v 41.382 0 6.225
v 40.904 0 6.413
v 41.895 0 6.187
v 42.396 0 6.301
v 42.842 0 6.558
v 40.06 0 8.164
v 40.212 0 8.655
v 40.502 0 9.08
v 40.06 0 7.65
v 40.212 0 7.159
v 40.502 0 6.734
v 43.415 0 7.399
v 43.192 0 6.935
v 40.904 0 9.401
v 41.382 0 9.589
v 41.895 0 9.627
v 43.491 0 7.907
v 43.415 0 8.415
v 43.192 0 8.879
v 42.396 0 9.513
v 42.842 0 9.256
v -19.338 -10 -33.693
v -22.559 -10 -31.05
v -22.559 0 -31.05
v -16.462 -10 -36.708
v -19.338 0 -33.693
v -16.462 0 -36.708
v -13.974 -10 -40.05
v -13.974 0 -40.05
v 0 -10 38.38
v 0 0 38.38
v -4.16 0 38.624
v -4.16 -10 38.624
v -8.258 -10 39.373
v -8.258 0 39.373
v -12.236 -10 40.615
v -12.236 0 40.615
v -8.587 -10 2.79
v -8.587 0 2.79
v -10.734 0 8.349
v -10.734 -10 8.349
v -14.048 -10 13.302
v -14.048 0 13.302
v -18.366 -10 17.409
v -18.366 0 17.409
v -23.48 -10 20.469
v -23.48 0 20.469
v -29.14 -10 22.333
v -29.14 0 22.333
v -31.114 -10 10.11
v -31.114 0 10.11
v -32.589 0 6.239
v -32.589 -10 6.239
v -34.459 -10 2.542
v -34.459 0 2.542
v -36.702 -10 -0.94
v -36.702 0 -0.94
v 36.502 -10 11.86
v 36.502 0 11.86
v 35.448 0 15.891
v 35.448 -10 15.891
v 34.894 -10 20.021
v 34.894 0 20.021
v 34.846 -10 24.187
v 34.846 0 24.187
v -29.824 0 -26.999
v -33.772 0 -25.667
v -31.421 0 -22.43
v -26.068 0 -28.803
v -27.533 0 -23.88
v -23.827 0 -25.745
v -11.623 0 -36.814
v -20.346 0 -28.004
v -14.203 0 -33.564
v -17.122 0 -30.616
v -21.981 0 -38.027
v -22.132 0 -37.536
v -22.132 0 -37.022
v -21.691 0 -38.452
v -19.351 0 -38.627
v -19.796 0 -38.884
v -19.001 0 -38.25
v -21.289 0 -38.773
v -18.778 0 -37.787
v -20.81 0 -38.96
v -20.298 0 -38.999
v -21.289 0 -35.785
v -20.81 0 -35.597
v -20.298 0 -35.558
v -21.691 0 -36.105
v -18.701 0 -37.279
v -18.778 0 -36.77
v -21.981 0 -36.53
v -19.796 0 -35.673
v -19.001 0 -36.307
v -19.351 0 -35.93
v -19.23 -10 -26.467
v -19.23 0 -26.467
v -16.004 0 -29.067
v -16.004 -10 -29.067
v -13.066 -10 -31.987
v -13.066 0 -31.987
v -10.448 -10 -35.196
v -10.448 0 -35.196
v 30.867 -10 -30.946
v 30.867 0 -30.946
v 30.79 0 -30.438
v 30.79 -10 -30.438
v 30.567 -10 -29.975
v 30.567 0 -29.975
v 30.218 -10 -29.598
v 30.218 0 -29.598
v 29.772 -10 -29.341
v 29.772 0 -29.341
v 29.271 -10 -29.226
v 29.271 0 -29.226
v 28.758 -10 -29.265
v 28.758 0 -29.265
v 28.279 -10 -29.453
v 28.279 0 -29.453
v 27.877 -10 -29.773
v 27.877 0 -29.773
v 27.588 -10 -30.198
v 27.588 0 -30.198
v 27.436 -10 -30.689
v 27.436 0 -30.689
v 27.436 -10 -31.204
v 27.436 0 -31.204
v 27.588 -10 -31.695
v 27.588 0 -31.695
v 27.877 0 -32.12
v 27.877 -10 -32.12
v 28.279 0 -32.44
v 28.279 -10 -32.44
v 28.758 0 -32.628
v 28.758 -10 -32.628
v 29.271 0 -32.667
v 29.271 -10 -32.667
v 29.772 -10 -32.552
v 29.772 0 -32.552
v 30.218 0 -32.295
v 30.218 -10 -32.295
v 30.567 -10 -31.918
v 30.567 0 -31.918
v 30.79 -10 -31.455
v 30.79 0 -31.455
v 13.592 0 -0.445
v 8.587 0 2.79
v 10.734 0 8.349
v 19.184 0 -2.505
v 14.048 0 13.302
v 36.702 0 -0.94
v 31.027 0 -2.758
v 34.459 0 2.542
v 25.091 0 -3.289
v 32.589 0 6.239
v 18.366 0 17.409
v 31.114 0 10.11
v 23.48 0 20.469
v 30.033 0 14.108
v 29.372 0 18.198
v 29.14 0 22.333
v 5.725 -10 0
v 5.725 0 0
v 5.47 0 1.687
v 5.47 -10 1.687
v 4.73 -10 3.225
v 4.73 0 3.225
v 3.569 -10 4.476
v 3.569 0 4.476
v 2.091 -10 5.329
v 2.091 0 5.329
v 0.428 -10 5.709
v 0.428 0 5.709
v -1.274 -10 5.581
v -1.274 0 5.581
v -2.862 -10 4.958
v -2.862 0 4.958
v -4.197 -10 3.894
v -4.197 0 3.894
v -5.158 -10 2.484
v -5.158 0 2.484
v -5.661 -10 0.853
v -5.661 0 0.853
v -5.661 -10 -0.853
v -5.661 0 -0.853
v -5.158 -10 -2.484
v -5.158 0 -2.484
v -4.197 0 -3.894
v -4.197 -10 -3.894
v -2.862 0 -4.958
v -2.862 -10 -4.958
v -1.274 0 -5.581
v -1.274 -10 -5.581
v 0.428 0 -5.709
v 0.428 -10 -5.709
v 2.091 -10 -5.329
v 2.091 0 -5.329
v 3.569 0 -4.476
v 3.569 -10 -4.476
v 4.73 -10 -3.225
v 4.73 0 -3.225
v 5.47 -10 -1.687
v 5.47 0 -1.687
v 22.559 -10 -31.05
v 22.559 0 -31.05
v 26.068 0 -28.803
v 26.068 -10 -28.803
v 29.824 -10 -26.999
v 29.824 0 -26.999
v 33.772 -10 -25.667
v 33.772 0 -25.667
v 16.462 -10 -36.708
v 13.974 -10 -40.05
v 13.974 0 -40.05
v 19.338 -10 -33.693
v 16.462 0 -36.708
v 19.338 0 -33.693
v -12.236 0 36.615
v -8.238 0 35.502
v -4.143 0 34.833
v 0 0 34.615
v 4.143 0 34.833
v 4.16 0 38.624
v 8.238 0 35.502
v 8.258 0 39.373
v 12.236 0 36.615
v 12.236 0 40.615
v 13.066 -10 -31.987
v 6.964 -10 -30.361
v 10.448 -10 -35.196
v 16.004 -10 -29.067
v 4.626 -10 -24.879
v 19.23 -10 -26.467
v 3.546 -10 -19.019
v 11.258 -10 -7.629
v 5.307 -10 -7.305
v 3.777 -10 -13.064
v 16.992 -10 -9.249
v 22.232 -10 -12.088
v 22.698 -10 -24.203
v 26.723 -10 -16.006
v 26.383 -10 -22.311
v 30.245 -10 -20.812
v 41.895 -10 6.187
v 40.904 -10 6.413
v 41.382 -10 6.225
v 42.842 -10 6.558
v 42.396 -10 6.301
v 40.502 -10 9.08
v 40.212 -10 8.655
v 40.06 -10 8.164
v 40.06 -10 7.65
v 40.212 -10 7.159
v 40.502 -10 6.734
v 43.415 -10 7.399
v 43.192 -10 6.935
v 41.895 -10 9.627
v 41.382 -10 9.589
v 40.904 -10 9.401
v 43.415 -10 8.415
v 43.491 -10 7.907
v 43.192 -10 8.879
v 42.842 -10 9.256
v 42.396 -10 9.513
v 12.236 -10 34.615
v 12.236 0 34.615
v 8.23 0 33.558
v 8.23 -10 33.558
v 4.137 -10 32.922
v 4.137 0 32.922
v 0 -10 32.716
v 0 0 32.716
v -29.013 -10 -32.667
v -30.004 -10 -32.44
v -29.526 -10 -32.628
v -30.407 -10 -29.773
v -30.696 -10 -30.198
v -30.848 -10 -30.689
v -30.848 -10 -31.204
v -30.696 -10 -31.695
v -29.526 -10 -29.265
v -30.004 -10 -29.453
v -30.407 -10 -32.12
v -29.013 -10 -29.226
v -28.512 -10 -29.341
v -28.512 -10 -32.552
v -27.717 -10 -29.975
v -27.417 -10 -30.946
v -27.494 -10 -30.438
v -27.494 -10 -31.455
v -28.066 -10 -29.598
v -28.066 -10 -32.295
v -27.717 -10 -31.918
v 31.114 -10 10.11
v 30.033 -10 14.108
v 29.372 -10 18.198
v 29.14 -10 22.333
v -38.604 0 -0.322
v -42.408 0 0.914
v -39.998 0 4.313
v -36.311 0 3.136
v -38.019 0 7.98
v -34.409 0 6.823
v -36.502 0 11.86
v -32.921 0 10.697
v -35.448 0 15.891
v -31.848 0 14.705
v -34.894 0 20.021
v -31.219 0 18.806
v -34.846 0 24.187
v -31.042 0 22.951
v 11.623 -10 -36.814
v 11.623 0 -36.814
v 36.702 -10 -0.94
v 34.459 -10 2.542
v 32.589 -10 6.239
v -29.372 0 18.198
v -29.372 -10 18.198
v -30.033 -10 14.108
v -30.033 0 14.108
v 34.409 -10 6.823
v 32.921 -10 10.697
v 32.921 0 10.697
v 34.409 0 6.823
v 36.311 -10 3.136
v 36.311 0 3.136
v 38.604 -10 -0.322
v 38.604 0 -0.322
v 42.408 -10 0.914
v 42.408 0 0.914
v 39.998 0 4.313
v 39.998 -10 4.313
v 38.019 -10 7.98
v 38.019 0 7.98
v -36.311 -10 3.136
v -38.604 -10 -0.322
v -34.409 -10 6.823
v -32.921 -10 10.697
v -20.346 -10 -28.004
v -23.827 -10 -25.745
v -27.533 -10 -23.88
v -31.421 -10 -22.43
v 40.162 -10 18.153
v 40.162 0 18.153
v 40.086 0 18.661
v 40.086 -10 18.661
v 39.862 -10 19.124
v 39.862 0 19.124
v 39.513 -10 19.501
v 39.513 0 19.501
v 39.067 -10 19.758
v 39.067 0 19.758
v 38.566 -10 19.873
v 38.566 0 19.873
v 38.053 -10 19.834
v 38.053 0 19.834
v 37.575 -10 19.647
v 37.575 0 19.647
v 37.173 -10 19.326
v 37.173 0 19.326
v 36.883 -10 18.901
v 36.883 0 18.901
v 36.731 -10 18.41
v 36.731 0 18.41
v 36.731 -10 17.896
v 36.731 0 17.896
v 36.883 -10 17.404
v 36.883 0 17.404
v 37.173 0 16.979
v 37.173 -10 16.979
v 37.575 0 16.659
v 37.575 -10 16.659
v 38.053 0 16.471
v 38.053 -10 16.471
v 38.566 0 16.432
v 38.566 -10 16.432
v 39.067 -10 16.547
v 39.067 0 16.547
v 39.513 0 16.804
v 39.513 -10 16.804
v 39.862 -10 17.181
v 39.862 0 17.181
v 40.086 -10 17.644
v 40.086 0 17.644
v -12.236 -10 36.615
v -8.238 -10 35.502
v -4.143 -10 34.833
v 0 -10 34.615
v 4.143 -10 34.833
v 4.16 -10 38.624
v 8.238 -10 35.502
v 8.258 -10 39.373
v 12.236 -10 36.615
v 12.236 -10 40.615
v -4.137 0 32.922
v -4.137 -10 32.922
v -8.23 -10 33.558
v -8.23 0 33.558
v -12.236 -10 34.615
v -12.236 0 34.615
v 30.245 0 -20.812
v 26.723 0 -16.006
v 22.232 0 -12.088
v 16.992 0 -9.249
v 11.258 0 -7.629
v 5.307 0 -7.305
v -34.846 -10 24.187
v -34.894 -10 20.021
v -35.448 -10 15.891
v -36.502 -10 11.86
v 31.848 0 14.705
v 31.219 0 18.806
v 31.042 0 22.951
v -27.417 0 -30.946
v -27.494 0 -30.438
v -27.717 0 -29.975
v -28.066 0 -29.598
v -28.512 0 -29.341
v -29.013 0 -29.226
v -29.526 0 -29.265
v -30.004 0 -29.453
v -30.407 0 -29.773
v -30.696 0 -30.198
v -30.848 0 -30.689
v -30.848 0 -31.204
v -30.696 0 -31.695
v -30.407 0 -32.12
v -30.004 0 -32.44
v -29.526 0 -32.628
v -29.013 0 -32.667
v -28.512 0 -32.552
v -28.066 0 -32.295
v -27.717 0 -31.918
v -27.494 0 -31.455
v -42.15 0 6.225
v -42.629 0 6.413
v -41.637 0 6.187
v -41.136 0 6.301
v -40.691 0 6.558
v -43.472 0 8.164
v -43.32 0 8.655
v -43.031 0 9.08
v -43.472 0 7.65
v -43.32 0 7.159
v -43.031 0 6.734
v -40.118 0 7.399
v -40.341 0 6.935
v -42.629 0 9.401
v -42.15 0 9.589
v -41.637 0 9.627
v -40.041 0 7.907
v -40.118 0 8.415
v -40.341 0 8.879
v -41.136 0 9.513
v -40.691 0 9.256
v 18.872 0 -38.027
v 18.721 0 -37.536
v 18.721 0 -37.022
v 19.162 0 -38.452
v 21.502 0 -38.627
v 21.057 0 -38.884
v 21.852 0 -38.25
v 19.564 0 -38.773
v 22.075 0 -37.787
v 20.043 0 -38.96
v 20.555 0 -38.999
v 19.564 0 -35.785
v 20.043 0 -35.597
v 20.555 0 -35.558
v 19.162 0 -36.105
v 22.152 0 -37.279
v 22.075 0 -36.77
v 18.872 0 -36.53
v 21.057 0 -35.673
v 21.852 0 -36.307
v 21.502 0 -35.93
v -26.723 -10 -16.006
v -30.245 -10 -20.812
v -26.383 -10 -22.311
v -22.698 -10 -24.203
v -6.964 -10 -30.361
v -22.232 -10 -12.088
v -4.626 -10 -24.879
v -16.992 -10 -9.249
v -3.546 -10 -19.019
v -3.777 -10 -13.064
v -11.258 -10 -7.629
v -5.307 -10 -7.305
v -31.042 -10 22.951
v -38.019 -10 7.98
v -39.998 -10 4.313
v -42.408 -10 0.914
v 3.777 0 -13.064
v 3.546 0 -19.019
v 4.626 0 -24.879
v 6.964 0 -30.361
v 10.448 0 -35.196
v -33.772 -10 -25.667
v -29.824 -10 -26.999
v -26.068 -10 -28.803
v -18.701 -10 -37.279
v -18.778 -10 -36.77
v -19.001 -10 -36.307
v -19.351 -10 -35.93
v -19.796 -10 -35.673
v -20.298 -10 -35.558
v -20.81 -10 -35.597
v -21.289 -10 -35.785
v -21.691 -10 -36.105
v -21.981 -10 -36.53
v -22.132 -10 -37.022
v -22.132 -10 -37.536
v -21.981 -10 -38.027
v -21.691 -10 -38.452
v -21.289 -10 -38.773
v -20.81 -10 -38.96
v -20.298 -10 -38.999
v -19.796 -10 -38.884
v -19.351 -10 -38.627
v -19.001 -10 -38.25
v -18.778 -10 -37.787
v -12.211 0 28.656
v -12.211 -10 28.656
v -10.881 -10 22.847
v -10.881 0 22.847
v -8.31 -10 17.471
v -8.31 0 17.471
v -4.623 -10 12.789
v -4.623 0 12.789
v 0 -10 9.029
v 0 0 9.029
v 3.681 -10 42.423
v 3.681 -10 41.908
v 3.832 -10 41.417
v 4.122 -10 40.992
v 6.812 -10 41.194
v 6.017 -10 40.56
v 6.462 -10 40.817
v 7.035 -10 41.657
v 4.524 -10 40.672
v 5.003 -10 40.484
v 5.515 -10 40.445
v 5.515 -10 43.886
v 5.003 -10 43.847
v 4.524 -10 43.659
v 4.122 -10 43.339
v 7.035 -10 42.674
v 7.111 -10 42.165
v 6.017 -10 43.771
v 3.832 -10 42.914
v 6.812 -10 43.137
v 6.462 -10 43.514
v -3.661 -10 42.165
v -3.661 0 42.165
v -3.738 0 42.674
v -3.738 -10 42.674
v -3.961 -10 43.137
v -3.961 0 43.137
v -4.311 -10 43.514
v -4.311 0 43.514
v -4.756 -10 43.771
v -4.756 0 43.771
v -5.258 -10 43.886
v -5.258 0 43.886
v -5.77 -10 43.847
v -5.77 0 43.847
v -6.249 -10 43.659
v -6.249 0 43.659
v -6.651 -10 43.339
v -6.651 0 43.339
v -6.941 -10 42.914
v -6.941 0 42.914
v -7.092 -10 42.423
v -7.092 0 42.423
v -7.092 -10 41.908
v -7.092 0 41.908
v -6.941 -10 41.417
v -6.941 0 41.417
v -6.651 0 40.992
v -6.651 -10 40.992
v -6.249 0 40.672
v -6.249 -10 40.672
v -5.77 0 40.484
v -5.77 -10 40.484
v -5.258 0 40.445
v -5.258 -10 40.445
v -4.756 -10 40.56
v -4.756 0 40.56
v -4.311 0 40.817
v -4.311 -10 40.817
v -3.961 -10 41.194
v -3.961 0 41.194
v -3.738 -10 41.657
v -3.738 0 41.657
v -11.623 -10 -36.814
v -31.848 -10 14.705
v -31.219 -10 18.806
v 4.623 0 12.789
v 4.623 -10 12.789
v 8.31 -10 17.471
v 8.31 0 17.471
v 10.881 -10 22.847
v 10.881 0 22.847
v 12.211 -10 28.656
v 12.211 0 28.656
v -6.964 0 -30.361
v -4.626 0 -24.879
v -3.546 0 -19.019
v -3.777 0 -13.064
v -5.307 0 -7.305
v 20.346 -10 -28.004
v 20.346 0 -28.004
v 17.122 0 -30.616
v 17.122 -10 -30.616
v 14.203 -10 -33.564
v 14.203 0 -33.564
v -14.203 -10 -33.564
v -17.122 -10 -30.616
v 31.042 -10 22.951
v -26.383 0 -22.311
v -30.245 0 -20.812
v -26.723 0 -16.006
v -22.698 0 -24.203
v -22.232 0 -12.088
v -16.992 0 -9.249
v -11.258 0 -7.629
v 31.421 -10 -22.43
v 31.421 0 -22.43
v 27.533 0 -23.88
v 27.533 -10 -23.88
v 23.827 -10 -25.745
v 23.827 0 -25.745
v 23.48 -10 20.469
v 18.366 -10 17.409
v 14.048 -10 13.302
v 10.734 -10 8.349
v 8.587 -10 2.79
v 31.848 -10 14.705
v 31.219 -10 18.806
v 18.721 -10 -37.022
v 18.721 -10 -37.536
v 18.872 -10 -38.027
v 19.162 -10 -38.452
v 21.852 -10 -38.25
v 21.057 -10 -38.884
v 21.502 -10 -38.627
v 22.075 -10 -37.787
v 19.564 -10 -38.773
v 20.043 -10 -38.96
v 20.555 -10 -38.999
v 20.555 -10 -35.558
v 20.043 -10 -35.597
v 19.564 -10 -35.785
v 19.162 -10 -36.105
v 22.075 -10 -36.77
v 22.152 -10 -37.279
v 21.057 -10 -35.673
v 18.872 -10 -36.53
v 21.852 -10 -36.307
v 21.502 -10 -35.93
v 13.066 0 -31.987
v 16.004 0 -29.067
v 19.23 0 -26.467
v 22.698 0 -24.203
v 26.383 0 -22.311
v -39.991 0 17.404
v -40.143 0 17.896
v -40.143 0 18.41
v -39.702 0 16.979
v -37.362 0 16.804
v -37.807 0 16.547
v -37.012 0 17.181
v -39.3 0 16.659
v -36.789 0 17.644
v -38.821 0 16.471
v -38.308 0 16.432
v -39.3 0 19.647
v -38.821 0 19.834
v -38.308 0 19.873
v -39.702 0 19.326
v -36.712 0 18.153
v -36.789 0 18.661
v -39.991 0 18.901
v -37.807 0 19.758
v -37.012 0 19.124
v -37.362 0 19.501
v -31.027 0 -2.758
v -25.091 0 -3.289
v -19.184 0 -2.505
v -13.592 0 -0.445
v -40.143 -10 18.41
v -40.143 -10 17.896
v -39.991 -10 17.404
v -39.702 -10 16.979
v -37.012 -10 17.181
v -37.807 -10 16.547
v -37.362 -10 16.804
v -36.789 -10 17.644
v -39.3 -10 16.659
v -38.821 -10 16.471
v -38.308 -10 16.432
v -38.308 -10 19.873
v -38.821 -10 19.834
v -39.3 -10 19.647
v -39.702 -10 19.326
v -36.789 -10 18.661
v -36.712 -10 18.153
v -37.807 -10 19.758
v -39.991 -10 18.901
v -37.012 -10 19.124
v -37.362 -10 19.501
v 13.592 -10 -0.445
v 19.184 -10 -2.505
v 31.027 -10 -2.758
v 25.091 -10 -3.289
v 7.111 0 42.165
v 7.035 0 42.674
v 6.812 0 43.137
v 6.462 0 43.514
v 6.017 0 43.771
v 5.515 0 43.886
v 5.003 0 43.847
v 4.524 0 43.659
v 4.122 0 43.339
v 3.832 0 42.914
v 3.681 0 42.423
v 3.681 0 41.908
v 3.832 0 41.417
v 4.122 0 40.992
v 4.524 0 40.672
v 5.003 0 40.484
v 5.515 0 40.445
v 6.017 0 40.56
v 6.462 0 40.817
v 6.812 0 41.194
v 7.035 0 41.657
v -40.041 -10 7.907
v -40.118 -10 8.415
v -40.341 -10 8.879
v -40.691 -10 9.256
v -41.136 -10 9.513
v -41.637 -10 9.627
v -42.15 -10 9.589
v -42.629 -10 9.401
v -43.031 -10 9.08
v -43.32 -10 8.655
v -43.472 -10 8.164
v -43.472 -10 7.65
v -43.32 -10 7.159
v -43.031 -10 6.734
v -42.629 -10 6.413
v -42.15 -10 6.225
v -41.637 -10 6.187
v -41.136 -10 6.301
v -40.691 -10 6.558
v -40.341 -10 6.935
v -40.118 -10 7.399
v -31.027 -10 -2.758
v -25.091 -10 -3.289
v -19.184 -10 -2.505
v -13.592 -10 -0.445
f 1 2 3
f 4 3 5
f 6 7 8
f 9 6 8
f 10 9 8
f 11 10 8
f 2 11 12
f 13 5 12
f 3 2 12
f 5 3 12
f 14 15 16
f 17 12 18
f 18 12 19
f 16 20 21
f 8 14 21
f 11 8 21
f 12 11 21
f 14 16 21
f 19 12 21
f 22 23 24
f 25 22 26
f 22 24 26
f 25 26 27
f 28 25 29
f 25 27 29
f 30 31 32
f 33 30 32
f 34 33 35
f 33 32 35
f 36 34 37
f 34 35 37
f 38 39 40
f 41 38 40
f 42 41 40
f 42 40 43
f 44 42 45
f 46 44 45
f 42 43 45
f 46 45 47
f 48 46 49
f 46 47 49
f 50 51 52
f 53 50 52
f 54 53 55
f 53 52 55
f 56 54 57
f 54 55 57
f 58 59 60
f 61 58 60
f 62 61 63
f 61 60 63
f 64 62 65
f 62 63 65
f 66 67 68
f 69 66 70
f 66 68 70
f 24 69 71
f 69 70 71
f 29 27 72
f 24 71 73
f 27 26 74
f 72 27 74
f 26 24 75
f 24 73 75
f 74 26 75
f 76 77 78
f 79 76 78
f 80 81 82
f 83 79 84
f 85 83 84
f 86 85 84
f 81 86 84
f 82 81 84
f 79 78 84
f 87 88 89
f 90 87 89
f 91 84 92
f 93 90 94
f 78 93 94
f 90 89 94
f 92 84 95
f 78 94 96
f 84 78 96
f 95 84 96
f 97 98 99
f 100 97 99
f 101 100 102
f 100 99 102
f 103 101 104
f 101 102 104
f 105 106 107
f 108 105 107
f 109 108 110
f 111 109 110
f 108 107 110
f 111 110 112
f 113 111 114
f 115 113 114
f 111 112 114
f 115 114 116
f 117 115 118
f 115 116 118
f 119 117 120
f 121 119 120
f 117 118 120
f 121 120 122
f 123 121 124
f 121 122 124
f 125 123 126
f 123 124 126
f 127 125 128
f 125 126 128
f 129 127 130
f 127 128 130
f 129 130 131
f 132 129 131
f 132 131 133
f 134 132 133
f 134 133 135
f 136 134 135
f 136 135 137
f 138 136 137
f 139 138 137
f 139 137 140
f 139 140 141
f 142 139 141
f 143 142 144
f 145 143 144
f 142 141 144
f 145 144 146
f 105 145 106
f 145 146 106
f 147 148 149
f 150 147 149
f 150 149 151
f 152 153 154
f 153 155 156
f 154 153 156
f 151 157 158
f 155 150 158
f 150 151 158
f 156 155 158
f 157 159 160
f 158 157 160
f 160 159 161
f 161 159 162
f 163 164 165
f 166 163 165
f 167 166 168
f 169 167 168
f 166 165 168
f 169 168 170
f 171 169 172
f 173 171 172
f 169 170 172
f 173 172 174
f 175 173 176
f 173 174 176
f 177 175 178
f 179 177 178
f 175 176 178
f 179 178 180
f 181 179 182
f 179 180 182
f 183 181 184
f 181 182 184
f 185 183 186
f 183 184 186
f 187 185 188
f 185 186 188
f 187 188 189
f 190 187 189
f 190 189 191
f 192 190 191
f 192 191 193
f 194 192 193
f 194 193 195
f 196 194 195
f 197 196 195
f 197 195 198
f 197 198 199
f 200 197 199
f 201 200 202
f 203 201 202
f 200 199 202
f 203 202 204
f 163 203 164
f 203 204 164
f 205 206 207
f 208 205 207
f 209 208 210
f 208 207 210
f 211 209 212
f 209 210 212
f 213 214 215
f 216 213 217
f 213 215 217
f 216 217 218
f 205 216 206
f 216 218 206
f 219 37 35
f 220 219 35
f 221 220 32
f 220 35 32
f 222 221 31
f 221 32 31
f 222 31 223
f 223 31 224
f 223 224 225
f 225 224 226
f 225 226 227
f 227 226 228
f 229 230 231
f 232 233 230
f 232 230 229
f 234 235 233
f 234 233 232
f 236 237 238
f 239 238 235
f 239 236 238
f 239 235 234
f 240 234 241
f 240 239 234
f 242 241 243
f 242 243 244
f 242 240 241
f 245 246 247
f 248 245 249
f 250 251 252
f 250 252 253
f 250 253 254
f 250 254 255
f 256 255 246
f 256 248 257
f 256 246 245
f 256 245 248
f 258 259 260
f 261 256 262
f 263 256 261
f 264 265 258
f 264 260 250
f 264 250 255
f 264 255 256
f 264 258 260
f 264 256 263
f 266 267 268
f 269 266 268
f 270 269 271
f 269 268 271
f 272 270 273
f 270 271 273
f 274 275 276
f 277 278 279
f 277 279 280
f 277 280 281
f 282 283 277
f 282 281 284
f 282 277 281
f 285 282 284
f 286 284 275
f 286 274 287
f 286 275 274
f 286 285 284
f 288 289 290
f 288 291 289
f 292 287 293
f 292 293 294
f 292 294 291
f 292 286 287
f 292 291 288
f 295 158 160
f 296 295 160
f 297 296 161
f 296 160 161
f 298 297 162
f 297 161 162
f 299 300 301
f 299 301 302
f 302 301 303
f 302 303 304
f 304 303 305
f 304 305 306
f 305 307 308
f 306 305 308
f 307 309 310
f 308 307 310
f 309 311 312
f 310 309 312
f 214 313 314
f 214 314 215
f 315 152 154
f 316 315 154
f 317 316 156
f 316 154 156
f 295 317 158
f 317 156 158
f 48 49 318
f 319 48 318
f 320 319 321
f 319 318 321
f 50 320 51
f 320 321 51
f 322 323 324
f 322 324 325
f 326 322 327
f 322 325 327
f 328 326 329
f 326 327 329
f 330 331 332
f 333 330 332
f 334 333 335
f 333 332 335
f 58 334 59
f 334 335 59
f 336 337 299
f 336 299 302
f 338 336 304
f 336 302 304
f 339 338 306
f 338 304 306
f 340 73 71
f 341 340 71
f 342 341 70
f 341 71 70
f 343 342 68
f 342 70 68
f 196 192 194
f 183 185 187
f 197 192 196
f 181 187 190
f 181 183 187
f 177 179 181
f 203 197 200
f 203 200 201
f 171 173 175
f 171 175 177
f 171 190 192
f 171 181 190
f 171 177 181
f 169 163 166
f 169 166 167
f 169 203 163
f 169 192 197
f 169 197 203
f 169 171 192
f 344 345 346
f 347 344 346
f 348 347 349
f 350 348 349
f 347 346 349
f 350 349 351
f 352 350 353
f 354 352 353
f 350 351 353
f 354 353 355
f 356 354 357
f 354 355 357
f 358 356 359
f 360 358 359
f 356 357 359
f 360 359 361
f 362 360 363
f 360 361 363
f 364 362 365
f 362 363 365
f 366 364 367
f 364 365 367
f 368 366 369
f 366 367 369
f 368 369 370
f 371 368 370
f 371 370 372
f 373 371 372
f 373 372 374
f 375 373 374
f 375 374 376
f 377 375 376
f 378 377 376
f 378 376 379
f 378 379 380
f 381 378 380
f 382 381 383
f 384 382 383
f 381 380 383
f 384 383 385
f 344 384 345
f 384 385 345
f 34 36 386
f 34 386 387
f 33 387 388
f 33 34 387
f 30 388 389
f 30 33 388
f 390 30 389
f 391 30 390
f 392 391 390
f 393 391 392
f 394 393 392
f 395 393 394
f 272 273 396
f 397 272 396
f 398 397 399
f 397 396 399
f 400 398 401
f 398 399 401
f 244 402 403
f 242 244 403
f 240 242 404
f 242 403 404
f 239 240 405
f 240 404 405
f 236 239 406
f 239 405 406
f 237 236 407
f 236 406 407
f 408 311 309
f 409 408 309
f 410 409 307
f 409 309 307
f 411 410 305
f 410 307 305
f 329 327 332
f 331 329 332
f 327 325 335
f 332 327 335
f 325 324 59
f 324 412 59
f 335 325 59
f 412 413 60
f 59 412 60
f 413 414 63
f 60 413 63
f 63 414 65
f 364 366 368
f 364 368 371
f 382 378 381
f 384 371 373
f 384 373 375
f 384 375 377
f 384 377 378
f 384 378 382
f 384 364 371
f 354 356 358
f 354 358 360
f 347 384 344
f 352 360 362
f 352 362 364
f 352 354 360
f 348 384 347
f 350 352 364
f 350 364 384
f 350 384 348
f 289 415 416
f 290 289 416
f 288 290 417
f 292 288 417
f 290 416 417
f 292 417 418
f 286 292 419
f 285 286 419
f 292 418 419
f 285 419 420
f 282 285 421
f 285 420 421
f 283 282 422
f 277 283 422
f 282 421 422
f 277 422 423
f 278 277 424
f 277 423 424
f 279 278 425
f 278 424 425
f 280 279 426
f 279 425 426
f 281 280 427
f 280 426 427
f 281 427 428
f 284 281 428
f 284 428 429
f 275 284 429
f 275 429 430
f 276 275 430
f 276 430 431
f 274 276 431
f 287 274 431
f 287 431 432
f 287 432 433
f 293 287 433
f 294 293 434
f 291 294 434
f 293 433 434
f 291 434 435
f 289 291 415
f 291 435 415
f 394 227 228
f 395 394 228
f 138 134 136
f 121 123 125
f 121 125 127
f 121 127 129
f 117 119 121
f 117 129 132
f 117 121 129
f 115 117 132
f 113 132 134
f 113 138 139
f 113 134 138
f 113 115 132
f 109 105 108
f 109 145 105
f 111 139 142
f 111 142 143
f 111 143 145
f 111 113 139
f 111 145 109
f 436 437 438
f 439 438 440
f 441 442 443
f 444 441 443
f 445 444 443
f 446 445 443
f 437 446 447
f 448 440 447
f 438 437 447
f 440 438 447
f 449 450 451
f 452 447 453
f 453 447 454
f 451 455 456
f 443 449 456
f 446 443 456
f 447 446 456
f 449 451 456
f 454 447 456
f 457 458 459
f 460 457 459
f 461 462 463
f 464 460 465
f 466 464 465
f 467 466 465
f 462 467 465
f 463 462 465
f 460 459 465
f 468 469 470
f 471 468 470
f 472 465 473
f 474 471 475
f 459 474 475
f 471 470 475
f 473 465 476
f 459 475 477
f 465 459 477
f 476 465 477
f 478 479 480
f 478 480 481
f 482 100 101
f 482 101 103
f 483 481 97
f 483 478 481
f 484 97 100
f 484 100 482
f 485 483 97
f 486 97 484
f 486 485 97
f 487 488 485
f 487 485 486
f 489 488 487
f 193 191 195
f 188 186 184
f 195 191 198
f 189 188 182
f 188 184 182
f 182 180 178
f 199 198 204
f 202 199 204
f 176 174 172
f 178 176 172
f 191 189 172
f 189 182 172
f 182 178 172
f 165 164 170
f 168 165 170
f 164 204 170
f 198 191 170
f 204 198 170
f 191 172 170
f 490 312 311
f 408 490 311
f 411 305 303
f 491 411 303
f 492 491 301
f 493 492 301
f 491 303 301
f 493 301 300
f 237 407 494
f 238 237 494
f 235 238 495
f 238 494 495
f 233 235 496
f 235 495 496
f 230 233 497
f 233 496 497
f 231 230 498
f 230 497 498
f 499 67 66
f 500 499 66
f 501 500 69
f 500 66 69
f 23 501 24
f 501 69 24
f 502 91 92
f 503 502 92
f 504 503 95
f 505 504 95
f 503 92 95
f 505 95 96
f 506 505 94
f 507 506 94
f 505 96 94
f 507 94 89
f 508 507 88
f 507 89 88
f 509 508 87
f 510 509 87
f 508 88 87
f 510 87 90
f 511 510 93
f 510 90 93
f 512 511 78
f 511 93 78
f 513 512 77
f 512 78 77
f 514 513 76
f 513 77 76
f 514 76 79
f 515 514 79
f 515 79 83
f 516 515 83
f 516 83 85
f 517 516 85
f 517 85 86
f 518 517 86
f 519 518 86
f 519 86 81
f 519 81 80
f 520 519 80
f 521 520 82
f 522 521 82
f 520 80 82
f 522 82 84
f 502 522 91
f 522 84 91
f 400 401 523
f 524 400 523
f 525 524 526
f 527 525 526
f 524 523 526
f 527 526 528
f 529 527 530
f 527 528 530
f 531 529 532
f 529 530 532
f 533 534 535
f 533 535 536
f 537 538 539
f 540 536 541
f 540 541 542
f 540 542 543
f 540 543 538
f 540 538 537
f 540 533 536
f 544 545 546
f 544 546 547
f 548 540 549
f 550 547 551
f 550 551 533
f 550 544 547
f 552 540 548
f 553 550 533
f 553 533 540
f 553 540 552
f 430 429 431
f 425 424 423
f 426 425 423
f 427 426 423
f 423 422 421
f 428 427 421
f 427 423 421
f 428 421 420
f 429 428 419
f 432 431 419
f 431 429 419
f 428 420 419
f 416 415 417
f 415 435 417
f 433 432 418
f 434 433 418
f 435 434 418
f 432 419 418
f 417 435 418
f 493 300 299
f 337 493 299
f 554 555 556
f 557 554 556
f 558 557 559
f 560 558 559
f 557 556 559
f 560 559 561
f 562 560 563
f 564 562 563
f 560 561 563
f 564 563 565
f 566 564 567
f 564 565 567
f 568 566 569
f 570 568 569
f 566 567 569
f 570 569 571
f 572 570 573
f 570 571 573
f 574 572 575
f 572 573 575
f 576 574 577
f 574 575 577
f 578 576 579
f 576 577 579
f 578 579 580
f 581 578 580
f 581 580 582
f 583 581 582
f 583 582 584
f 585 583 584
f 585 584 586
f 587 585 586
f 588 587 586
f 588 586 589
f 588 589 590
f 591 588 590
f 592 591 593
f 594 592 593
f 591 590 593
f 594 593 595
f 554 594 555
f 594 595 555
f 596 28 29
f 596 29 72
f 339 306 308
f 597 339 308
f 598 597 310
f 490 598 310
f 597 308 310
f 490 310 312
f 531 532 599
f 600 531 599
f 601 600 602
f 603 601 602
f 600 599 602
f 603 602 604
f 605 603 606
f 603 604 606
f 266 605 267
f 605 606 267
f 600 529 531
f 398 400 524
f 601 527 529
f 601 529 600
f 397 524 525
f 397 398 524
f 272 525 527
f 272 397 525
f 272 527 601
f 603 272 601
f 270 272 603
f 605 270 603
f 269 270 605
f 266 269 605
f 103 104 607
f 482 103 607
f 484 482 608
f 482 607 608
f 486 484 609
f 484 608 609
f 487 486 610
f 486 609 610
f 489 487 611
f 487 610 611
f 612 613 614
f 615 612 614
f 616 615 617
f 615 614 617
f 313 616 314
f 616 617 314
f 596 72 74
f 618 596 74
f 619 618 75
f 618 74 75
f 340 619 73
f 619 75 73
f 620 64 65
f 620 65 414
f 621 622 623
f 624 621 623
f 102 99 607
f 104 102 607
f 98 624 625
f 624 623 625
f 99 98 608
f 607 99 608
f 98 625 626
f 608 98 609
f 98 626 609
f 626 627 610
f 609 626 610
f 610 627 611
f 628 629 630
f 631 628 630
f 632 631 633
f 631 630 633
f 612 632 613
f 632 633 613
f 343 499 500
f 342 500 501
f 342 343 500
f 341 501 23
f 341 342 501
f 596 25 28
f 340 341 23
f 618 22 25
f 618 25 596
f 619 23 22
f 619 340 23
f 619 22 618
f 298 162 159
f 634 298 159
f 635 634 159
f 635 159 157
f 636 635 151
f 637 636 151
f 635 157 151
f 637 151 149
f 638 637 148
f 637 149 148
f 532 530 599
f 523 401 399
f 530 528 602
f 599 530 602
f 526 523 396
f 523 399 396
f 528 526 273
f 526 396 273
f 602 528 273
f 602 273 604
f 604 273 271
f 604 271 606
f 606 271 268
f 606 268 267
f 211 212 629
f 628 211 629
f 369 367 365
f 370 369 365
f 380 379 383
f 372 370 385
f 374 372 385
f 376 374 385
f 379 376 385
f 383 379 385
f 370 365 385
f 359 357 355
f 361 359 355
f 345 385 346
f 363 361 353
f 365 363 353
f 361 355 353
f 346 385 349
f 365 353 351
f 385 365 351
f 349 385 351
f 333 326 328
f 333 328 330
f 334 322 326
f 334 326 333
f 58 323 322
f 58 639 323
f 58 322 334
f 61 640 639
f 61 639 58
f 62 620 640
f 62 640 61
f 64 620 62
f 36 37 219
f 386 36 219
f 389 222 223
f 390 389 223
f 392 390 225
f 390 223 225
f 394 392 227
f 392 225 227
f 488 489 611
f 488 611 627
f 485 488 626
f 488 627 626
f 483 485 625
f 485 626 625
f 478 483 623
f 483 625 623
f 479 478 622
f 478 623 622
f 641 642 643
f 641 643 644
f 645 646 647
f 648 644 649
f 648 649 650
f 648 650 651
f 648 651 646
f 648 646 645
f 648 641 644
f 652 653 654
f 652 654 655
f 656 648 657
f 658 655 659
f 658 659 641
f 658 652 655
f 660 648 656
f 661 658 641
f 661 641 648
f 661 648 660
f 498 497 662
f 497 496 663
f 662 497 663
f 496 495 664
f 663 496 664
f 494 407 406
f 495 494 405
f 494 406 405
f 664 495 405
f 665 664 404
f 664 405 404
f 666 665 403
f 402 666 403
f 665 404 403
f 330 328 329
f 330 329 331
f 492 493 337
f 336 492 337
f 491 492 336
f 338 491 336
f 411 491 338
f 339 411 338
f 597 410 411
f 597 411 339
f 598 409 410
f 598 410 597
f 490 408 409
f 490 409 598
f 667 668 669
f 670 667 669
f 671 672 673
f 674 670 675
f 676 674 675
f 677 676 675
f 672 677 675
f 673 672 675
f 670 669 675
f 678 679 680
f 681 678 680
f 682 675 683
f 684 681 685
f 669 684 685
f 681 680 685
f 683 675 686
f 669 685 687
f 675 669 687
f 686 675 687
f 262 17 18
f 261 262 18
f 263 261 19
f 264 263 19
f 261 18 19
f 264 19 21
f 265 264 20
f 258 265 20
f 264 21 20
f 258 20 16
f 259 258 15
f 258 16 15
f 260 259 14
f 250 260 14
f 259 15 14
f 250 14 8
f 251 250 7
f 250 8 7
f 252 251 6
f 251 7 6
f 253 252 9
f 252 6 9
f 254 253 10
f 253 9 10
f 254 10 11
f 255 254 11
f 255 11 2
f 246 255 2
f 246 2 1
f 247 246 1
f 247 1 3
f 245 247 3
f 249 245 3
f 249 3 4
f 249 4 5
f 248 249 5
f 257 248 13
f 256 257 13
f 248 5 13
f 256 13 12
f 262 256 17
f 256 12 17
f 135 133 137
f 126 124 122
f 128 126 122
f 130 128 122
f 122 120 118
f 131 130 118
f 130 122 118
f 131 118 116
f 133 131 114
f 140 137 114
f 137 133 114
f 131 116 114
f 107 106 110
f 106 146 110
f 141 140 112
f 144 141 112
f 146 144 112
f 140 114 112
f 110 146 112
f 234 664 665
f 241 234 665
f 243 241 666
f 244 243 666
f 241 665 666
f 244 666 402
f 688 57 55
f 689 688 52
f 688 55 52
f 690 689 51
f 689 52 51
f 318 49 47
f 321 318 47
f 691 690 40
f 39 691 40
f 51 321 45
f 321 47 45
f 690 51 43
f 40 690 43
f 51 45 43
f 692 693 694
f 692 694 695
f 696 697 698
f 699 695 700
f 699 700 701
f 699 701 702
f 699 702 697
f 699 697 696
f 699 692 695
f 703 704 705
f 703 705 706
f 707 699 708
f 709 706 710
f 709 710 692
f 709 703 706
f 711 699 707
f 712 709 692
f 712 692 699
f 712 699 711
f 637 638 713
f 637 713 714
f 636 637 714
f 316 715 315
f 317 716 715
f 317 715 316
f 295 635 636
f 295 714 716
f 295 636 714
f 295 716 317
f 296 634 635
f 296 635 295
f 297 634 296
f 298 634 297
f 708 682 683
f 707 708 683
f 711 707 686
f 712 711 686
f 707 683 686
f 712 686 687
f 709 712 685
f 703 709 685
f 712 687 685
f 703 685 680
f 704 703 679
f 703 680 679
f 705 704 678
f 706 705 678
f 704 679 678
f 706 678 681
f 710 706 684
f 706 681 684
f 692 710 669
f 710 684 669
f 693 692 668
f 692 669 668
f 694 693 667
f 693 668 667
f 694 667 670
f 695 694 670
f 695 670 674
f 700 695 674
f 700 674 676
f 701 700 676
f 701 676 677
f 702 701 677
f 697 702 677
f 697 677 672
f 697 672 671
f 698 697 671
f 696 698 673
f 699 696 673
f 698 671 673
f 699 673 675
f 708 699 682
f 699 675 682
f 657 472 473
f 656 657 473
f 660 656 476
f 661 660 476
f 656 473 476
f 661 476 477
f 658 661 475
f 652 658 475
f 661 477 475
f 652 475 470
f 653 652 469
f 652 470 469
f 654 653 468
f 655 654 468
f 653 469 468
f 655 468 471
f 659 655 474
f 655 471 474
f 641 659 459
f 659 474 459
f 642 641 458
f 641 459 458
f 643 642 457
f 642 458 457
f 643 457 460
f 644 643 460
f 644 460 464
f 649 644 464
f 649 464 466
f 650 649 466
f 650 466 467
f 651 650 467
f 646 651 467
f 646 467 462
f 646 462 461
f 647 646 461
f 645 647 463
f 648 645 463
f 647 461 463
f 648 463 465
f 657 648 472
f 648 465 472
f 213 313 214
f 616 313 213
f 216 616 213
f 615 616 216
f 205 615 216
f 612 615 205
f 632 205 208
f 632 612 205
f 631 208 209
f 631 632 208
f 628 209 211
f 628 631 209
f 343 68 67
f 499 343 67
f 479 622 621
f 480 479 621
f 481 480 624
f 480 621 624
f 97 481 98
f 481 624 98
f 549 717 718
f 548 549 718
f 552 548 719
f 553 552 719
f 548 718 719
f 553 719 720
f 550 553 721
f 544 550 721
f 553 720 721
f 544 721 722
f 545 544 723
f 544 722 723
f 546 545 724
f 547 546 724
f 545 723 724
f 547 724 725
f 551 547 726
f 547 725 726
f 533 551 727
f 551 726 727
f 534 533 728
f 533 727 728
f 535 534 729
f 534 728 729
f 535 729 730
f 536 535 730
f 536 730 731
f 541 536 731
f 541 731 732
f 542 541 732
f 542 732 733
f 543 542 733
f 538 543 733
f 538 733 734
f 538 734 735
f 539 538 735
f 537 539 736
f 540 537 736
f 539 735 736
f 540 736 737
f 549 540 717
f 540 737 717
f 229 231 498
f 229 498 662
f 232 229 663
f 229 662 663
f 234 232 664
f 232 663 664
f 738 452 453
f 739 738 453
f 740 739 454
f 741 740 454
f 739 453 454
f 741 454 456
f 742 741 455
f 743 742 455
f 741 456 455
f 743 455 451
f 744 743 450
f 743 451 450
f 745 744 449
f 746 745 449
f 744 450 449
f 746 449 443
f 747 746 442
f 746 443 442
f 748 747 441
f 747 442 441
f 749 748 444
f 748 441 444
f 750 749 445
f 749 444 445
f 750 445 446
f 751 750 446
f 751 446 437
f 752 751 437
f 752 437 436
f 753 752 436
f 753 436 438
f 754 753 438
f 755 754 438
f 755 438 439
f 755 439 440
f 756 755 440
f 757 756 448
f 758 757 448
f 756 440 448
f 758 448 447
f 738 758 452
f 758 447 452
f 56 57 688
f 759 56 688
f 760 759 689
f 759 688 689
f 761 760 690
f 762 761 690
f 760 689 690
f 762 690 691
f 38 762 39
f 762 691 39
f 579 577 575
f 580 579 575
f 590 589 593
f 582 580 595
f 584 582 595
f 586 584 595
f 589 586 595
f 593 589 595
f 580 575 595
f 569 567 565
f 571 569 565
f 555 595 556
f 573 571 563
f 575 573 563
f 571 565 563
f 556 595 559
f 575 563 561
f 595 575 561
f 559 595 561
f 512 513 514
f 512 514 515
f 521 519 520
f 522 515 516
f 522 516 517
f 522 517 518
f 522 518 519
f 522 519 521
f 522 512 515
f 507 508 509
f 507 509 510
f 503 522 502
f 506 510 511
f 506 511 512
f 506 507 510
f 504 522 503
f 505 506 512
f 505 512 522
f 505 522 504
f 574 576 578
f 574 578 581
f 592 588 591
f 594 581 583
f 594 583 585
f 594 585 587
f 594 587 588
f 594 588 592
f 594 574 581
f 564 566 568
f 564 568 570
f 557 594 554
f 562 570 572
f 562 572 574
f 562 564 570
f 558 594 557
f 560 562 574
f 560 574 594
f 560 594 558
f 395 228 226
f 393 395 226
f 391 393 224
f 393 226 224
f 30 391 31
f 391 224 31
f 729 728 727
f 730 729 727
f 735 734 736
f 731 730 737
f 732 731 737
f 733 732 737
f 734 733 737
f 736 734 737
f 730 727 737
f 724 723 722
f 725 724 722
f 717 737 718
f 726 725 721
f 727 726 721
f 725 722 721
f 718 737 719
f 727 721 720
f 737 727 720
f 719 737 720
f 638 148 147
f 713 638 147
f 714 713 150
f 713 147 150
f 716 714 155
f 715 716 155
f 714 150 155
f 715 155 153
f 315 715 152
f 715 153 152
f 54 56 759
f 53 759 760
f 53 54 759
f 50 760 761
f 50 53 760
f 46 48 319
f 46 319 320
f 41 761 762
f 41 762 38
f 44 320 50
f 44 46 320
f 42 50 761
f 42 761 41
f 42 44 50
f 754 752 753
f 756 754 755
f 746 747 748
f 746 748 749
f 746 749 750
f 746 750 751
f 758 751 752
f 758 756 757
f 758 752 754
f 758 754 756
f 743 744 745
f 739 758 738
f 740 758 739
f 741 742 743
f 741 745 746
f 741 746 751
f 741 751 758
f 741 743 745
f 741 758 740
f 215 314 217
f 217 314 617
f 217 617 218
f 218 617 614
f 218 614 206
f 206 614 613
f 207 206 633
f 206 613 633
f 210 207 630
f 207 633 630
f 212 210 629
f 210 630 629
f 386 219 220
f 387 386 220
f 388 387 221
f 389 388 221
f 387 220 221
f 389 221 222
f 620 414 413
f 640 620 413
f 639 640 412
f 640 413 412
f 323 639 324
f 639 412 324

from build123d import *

# Parameters (mm, degrees)
F0_R     = 5.724774
F0_R_2   = 1.725023
F1_DEPTH = 10


with BuildPart() as f1:
    # F0 (on Front) → F1 (new body)
    with BuildSketch(Plane.XZ):
        with BuildLine():
            ThreePointArc((-31.114318, 10.109655), (-33.476029, 4.366319), (-36.701992, -0.939973))
            ThreePointArc((-36.701992, -0.939973), (-22.11578, -3.060098), (-8.587001, 2.790086))
            ThreePointArc((-8.587001, 2.790086), (-16.093362, 15.475), (-29.140033, 22.333344))
            ThreePointArc((-29.140033, 22.333344), (-29.649134, 16.14429), (-31.114318, 10.109655))
        make_face()
        with BuildLine():
            ThreePointArc((-32.921013, 10.696685), (-31.477347, 16.746724), (-31.042146, 22.951378))
            Line((-31.042146, 22.951378), (-34.846372, 24.187446))
            ThreePointArc((-34.846372, 24.187446), (-35.108153, 17.947796), (-36.501702, 11.860122))
            ThreePointArc((-36.501702, 11.860122), (-38.952543, 6.115982), (-42.408331, 0.914129))
            Line((-42.408331, 0.914129), (-38.604105, -0.321939))
            ThreePointArc((-38.604105, -0.321939), (-35.309186, 4.953536), (-32.921013, 10.696685))
        make_face()
        with BuildLine():
            ThreePointArc((0, 32.71553), (-6.192045, 33.186862), (-12.235507, 34.615201))
            ThreePointArc((-12.235507, 34.615201), (-9.744478, 20.087735), (0, 9.028907))
            ThreePointArc((0, 9.028907), (9.744478, 20.087735), (12.235507, 34.615201))
            ThreePointArc((12.235507, 34.615201), (6.192045, 33.186862), (0, 32.71553))
        make_face()
        with BuildLine():
            Line((-12.235507, 40.615201), (-12.235507, 36.615201))
            ThreePointArc((-12.235507, 36.615201), (-6.200046, 35.111758), (0, 34.615201))
            ThreePointArc((0, 34.615201), (6.200046, 35.111758), (12.235507, 36.615201))
            Line((12.235507, 36.615201), (12.235507, 40.615201))
            ThreePointArc((12.235507, 40.615201), (6.220353, 38.936012), (0, 38.380161))
            ThreePointArc((0, 38.380161), (-6.220353, 38.936012), (-12.235507, 40.615201))
        make_face()
        with BuildLine():
            ThreePointArc((31.114318, 10.109655), (29.649134, 16.14429), (29.140033, 22.333344))
            ThreePointArc((29.140033, 22.333344), (16.093362, 15.475), (8.587001, 2.790086))
            ThreePointArc((8.587001, 2.790086), (22.11578, -3.060098), (36.701992, -0.939973))
            ThreePointArc((36.701992, -0.939973), (33.476029, 4.366319), (31.114318, 10.109655))
        make_face()
        with BuildLine():
            ThreePointArc((32.921013, 10.696685), (35.309186, 4.953536), (38.604105, -0.321939))
            Line((38.604105, -0.321939), (42.408331, 0.914129))
            ThreePointArc((42.408331, 0.914129), (38.952543, 6.115982), (36.501702, 11.860122))
            ThreePointArc((36.501702, 11.860122), (35.108153, 17.947796), (34.846372, 24.187446))
            Line((34.846372, 24.187446), (31.042146, 22.951378))
            ThreePointArc((31.042146, 22.951378), (31.477347, 16.746724), (32.921013, 10.696685))
        make_face()
        with BuildLine():
            ThreePointArc((19.229706, -26.467419), (24.516218, -23.209143), (30.245038, -20.812435))
            ThreePointArc((30.245038, -20.812435), (19.690722, -10.523658), (5.307059, -7.304539))
            ThreePointArc((5.307059, -7.304539), (3.923826, -21.978979), (10.447572, -35.196137))
            ThreePointArc((10.447572, -35.196137), (14.497278, -30.488329), (19.229706, -26.467419))
        make_face()
        with BuildLine():
            ThreePointArc((20.346305, -28.004286), (15.622231, -32.050305), (11.623142, -36.814171))
            Line((11.623142, -36.814171), (13.974283, -40.050239))
            ThreePointArc((13.974283, -40.050239), (17.853643, -35.156127), (22.559293, -31.050203))
            ThreePointArc((22.559293, -31.050203), (27.918385, -27.843664), (33.77175, -25.666537))
            Line((33.77175, -25.666537), (31.420608, -22.430469))
            ThreePointArc((31.420608, -22.430469), (25.654116, -24.761714), (20.346305, -28.004286))
        make_face()
        with BuildLine():
            ThreePointArc((-19.229706, -26.467419), (-14.497278, -30.488329), (-10.447572, -35.196137))
            ThreePointArc((-10.447572, -35.196137), (-3.923826, -21.978979), (-5.307059, -7.304539))
            ThreePointArc((-5.307059, -7.304539), (-19.690722, -10.523658), (-30.245038, -20.812435))
            ThreePointArc((-30.245038, -20.812435), (-24.516218, -23.209143), (-19.229706, -26.467419))
        make_face()
        with BuildLine():
            ThreePointArc((-20.346305, -28.004286), (-25.654116, -24.761714), (-31.420608, -22.430469))
            Line((-31.420608, -22.430469), (-33.77175, -25.666537))
            ThreePointArc((-33.77175, -25.666537), (-27.918385, -27.843664), (-22.559293, -31.050203))
            ThreePointArc((-22.559293, -31.050203), (-17.853643, -35.156127), (-13.974283, -40.050239))
            Line((-13.974283, -40.050239), (-11.623142, -36.814171))
            ThreePointArc((-11.623142, -36.814171), (-15.622231, -32.050305), (-20.346305, -28.004286))
        make_face()
        Circle(F0_R)
        with Locations((-5.386472, 42.165443)):
            Circle(F0_R_2)
        with Locations((5.386472, 42.165443)):
            Circle(F0_R_2)
        with Locations((38.437208, 18.152678)):
            Circle(F0_R_2)
        with Locations((41.766231, 7.906999)):
            Circle(F0_R_2)
        with Locations((29.141973, -30.946471)):
            Circle(F0_R_2)
        with Locations((20.426478, -37.278649)):
            Circle(F0_R_2)
        with Locations((-20.426478, -37.278649)):
            Circle(F0_R_2)
        with Locations((-29.141973, -30.946471)):
            Circle(F0_R_2)
        with Locations((-41.766231, 7.906999)):
            Circle(F0_R_2)
        with Locations((-38.437208, 18.152678)):
            Circle(F0_R_2)
    extrude(amount=F1_DEPTH)


solid = f1.part
